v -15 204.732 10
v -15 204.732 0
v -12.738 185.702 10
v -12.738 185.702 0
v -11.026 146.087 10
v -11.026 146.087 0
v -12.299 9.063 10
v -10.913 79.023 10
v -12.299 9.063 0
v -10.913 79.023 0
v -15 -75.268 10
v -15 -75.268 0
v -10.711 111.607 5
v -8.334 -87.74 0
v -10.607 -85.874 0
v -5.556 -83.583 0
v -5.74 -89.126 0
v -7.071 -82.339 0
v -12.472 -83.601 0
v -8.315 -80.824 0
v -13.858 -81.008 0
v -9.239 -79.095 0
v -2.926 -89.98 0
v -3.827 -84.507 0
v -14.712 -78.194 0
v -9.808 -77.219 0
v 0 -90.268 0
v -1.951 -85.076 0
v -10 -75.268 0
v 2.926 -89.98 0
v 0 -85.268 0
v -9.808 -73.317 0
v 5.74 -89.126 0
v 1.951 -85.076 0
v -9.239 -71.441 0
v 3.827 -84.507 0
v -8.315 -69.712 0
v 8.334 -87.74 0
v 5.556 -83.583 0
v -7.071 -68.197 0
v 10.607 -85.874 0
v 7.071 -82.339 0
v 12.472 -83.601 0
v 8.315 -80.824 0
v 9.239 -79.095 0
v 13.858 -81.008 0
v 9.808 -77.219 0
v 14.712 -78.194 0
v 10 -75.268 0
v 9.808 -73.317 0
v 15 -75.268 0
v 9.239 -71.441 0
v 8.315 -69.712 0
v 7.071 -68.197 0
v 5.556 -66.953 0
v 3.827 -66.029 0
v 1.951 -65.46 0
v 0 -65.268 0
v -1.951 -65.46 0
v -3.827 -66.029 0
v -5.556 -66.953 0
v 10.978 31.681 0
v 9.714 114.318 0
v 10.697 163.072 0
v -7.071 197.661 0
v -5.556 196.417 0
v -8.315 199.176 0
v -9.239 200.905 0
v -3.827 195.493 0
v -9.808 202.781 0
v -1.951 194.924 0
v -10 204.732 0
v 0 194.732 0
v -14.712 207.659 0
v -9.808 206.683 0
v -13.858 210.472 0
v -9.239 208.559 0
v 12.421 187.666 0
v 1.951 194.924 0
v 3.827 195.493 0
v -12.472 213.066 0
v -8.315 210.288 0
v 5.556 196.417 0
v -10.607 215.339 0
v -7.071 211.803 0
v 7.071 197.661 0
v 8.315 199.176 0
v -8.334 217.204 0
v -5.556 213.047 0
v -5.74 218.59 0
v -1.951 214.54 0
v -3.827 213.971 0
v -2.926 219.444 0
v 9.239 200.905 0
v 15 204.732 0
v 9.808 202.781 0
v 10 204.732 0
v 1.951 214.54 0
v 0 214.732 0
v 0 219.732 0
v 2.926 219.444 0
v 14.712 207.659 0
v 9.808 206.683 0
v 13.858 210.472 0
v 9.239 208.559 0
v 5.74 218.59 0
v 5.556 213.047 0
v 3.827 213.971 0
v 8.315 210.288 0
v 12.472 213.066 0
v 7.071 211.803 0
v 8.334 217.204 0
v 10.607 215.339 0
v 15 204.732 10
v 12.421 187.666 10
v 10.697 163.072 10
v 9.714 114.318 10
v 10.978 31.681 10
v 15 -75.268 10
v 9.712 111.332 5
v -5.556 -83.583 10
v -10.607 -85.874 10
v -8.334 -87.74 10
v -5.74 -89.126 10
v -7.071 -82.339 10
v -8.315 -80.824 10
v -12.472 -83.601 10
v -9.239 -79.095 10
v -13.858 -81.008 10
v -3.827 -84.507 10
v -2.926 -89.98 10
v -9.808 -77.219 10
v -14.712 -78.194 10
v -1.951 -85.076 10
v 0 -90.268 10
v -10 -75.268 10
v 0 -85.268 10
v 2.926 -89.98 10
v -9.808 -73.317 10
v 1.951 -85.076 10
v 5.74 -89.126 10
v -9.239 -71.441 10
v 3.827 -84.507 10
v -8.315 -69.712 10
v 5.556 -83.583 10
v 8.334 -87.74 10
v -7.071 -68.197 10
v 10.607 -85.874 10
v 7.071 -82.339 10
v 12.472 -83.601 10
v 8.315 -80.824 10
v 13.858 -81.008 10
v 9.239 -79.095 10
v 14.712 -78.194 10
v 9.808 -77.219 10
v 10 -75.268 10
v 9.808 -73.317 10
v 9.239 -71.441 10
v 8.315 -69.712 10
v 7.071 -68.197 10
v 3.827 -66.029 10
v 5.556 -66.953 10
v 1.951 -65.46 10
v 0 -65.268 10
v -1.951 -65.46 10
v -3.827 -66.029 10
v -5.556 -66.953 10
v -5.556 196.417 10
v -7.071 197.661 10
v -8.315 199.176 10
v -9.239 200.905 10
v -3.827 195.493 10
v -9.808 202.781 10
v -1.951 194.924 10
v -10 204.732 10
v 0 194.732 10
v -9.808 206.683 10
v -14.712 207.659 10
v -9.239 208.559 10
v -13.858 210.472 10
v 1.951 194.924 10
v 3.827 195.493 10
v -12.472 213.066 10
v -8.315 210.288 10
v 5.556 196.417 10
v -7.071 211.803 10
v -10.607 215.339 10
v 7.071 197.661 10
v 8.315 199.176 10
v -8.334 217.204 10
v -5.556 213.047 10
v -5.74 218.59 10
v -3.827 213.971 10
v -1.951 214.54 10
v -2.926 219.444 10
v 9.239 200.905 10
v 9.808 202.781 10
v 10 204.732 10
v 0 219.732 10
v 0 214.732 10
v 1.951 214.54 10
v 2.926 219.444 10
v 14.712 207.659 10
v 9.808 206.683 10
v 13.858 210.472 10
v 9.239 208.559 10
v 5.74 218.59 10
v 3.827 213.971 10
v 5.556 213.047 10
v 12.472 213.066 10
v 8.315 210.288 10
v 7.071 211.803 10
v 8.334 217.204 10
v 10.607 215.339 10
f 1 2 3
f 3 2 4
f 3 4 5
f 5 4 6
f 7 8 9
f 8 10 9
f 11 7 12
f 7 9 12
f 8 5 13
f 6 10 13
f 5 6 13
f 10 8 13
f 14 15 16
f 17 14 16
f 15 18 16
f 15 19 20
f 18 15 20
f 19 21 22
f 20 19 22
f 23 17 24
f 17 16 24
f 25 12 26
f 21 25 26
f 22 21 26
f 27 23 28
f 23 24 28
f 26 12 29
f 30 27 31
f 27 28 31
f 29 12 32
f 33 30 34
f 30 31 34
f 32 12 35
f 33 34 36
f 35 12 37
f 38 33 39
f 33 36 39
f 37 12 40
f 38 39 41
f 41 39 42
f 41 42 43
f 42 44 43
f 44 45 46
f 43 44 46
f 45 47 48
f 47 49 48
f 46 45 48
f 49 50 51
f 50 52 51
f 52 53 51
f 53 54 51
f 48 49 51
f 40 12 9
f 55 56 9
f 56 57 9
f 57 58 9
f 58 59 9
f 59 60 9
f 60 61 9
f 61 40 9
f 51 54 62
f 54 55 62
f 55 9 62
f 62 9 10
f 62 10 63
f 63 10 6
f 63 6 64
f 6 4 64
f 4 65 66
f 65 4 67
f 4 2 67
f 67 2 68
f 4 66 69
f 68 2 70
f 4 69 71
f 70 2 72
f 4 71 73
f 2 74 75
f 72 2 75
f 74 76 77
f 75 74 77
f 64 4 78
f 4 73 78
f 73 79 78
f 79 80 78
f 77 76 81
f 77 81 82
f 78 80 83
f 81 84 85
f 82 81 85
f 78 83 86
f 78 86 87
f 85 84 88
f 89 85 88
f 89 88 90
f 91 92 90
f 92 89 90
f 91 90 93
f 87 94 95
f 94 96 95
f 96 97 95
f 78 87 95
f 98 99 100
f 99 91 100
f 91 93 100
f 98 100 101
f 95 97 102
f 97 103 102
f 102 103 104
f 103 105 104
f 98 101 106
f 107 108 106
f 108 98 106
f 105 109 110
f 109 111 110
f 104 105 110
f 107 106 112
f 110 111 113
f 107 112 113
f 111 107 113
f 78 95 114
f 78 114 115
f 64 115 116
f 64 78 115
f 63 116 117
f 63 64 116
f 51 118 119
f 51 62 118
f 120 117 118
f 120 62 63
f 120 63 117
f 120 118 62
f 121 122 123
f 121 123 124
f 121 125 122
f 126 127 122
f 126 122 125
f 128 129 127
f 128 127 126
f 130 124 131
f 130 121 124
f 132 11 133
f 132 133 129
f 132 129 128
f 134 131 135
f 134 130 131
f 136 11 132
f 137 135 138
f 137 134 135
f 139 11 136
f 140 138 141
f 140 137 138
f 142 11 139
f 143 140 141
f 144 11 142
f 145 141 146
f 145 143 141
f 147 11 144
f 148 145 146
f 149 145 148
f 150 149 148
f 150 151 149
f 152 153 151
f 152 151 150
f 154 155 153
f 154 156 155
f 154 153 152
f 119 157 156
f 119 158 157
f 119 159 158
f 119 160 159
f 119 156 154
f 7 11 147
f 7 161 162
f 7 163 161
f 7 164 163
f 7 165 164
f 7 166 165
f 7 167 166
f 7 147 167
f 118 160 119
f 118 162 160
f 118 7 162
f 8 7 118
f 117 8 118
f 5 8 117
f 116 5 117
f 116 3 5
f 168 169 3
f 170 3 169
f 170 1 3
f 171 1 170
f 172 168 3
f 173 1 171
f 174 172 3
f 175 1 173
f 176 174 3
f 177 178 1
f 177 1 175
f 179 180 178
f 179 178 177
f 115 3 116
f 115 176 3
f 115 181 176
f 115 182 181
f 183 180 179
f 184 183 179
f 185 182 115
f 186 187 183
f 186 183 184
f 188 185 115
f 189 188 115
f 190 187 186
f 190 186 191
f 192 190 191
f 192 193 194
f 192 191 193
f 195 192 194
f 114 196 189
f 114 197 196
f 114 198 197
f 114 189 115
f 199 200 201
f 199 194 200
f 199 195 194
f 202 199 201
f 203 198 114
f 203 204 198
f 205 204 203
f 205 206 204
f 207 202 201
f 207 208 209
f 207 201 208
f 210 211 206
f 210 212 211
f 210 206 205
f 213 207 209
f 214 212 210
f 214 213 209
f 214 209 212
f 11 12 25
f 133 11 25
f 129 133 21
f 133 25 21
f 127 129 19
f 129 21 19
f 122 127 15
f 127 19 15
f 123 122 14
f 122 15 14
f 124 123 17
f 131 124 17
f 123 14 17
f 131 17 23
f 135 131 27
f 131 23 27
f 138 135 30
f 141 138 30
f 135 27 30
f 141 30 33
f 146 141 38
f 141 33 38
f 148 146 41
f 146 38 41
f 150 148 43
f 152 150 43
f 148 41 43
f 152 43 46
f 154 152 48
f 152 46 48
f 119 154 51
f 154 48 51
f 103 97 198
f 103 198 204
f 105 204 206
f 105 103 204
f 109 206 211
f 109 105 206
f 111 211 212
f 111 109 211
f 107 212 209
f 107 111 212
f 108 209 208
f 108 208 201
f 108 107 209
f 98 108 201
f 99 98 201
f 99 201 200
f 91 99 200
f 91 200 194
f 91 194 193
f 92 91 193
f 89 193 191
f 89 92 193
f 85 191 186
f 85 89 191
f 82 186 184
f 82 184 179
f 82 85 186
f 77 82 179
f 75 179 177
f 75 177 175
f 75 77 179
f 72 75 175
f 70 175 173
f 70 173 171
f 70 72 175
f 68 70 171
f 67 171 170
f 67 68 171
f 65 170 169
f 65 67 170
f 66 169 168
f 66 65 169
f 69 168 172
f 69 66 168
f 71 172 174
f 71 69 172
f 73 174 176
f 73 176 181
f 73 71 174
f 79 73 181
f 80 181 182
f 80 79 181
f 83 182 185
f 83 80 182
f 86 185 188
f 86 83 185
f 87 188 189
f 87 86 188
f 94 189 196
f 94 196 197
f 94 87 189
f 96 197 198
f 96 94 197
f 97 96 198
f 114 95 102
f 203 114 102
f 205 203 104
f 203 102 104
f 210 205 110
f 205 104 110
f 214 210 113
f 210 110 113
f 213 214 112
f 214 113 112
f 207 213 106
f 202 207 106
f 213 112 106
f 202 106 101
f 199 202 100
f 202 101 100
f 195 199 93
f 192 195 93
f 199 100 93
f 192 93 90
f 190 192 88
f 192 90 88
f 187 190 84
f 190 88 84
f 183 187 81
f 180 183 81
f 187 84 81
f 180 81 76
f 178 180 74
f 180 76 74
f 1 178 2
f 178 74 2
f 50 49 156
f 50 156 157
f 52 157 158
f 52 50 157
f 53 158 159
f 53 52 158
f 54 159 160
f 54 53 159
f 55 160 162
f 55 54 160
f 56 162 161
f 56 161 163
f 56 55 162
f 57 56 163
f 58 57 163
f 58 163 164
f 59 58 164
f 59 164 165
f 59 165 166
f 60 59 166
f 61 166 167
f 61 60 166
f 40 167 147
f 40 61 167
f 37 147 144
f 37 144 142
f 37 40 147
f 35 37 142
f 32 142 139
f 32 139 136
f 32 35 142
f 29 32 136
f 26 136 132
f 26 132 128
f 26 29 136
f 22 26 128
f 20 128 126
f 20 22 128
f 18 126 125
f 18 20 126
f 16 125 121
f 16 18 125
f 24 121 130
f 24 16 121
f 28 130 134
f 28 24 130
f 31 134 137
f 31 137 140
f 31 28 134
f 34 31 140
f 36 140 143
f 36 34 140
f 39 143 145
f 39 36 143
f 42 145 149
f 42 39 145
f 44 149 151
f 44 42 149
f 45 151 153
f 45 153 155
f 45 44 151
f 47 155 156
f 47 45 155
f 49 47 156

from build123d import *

# Parameters (mm, degrees)
SKETCH1_R           = 10
BOSS_EXTRUDE1_DEPTH = 10


with BuildPart() as part:
    # Sketch1 → Boss-Extrude1 (new body)
    with BuildSketch(Plane.XY):
        with BuildLine():
            ThreePointArc((-15, -75.267843328), (0, -90.267843328), (15, -75.267843328))
            add(Edge.make_bspline(
                [(15, 204.732156672), (4.423835308, 157.931962062), (15, -75.267843328)],
                knots=[0, 0, 0, 1, 1, 1], degree=2))
            ThreePointArc((15, 204.732156672), (0, 219.732156672), (-15, 204.732156672))
            add(Edge.make_bspline(
                [(-15, 204.732156672), (-6.422661748, 158.481211522), (-15, -75.267843328)],
                knots=[0, 0, 0, 1, 1, 1], degree=2))
        make_face()
        with Locations((0, -75.267843328)):
            Circle(SKETCH1_R, mode=Mode.SUBTRACT)
        with Locations((0, 204.732156672)):
            Circle(SKETCH1_R, mode=Mode.SUBTRACT)
    extrude(amount=BOSS_EXTRUDE1_DEPTH)


solid = part.part
